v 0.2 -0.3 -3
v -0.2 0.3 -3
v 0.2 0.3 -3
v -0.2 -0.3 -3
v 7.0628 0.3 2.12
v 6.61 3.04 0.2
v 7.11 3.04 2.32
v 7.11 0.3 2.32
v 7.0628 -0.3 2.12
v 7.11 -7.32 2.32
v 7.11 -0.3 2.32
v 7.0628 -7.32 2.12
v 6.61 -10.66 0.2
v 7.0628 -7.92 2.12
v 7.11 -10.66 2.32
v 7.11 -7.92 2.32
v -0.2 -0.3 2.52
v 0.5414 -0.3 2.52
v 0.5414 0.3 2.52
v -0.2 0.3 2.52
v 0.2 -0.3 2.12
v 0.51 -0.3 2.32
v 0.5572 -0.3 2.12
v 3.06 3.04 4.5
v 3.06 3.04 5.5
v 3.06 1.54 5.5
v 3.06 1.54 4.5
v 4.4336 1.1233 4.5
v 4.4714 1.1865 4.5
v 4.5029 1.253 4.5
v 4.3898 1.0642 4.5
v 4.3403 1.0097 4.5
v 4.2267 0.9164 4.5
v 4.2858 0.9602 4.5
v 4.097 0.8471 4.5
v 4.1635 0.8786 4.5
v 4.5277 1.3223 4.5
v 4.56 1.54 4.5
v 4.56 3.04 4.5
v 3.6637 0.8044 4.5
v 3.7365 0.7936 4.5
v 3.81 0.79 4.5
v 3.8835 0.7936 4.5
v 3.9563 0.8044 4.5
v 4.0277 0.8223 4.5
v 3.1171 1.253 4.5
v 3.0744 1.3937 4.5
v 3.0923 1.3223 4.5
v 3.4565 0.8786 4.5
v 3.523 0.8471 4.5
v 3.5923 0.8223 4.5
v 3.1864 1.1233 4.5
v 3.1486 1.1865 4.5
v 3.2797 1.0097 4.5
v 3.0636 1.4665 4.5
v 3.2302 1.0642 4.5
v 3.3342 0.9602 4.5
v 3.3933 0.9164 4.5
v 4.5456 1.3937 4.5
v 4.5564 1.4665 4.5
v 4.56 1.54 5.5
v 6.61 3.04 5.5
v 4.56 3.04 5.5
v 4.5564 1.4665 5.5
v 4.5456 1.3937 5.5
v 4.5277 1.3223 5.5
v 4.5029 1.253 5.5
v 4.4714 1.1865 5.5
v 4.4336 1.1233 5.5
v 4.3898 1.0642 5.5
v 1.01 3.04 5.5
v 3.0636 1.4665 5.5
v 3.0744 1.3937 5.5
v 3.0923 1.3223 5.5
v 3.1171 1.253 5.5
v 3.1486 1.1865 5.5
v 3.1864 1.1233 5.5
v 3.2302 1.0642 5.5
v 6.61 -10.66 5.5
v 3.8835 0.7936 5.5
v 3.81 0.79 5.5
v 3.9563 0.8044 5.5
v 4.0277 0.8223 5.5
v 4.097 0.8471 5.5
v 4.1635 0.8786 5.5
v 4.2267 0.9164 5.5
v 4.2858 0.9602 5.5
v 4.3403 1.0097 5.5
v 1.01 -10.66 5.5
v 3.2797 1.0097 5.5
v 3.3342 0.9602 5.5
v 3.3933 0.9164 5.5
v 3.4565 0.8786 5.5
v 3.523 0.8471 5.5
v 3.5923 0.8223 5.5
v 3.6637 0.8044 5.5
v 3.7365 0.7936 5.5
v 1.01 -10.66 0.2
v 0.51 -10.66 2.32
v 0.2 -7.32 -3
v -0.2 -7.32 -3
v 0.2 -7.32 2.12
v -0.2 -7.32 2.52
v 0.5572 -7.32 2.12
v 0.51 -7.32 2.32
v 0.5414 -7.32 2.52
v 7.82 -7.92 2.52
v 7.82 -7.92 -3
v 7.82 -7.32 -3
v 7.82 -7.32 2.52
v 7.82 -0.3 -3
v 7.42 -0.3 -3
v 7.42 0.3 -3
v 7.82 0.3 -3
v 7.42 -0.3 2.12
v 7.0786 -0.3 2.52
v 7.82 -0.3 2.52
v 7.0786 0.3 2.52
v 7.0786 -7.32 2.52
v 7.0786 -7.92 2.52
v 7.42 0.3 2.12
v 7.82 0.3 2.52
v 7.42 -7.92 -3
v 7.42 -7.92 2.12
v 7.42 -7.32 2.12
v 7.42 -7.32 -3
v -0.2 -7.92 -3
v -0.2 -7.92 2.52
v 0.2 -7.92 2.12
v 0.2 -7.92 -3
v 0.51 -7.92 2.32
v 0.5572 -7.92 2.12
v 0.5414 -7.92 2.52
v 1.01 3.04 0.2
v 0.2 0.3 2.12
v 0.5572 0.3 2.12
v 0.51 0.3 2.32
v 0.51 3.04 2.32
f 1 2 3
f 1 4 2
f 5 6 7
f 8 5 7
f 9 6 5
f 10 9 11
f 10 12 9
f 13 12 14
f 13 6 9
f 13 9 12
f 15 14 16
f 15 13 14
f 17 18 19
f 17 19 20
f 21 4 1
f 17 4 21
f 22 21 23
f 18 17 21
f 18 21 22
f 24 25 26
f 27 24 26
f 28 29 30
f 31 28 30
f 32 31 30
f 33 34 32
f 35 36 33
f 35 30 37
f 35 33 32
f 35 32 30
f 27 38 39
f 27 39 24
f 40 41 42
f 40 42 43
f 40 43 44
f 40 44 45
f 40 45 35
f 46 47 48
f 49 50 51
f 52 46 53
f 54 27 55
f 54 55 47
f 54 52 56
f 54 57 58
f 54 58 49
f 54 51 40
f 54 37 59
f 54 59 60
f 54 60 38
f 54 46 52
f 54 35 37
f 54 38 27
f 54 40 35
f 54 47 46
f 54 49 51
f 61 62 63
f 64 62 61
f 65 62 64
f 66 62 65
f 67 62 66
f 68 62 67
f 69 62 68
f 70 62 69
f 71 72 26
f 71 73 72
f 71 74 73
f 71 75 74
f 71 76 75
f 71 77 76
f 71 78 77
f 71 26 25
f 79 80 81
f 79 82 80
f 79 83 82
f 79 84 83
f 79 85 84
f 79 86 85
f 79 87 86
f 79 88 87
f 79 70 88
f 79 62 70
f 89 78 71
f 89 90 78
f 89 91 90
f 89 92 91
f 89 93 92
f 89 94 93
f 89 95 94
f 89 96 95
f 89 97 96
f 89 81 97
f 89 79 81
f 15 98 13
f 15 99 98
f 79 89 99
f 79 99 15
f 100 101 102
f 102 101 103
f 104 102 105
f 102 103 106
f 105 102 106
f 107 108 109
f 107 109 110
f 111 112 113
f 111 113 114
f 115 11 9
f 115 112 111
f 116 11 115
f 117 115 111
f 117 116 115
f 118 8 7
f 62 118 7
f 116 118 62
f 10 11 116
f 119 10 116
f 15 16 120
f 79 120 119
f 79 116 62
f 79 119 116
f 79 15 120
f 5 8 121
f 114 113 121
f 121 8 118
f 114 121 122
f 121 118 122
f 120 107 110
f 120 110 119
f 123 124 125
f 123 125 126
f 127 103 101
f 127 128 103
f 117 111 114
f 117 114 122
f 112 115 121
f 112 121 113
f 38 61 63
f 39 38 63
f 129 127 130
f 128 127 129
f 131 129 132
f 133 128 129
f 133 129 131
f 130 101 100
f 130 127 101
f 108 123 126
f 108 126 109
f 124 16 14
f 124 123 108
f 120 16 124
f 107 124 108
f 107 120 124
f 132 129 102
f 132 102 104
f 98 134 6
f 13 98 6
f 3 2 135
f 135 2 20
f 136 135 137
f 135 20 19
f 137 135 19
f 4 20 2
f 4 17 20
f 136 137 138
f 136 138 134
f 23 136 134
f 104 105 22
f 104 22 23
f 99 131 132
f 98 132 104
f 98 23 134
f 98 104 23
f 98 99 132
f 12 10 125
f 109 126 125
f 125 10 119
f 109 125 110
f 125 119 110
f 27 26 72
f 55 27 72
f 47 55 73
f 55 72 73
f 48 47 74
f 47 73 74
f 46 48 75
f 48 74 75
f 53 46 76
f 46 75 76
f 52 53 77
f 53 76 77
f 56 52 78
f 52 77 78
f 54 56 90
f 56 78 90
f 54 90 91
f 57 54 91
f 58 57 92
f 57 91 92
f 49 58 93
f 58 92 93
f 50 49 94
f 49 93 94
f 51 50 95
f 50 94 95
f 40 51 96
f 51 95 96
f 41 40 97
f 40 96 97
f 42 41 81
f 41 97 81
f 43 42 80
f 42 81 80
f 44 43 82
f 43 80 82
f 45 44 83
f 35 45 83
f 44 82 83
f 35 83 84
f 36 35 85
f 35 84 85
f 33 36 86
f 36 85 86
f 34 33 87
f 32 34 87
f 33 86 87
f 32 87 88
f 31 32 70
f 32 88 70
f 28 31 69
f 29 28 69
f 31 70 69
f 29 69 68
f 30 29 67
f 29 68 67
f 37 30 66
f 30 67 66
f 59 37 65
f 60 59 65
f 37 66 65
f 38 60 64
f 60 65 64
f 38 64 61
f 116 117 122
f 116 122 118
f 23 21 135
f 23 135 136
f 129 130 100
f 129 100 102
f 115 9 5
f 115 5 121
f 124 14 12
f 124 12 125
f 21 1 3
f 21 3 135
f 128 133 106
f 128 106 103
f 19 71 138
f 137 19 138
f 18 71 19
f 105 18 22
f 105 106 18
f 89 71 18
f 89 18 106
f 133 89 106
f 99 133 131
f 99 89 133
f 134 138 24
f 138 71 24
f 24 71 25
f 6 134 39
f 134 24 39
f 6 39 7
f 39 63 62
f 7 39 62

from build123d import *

# Parameters (mm, degrees)
PAD002_DEPTH = 0.3
PAD_DEPTH    = 6.85
POCKET_DEPTH = 1
PAD001_DEPTH = 0.3


with BuildPart() as pad002:
    # Sketch002 → Pad002 (new body, symmetric)
    with BuildSketch(Plane.XZ.offset(7.62)):
        Polygon((-0.2, -3), (0.2, -3), (0.2, 2.12), (7.42, 2.12), (7.42, -3), (7.82, -3), (7.82, 2.52), (-0.2, 2.52), align=None)
    extrude(amount=PAD002_DEPTH, both=True)


with BuildPart() as pocket:
    # Sketch → Pad (new body, symmetric)
    with BuildSketch(Plane.XZ.offset(3.81)):
        Polygon((1.01, 0.2), (6.61, 0.2), (7.11, 2.32), (6.61, 5.5), (1.01, 5.5), (0.51, 2.32), align=None)
    extrude(amount=PAD_DEPTH, both=True)

    # Sketch003 → Pocket (cut)
    with BuildSketch(Plane(origin=(0, -3.81, 5.5), x_dir=(-1, 0, 0), z_dir=(0, 0, 1))):
        with BuildLine():
            ThreePointArc((-3.06, -5.35), (-3.81, -4.6), (-4.56, -5.35))
            Line((-4.56, -5.35), (-4.56, -6.85))
            Line((-4.56, -6.85), (-3.06, -6.85))
            Line((-3.06, -6.85), (-3.06, -5.35))
        make_face()
    extrude(amount=-POCKET_DEPTH, mode=Mode.SUBTRACT)


with BuildPart() as oscillator_seikoepson_sg_8002dc:
    # Sketch001 → Pad001 (new body, symmetric)
    with BuildSketch(Plane.XZ):
        Polygon((-0.2, -3), (0.2, -3), (0.2, 2.12), (7.42, 2.12), (7.42, -3), (7.82, -3), (7.82, 2.52), (-0.2, 2.52), align=None)
    extrude(amount=PAD001_DEPTH, both=True)

    # Pad001_mp_cp: union Pad002, Pocket
    add(pad002.part)
    add(pocket.part)


solid = oscillator_seikoepson_sg_8002dc.part
